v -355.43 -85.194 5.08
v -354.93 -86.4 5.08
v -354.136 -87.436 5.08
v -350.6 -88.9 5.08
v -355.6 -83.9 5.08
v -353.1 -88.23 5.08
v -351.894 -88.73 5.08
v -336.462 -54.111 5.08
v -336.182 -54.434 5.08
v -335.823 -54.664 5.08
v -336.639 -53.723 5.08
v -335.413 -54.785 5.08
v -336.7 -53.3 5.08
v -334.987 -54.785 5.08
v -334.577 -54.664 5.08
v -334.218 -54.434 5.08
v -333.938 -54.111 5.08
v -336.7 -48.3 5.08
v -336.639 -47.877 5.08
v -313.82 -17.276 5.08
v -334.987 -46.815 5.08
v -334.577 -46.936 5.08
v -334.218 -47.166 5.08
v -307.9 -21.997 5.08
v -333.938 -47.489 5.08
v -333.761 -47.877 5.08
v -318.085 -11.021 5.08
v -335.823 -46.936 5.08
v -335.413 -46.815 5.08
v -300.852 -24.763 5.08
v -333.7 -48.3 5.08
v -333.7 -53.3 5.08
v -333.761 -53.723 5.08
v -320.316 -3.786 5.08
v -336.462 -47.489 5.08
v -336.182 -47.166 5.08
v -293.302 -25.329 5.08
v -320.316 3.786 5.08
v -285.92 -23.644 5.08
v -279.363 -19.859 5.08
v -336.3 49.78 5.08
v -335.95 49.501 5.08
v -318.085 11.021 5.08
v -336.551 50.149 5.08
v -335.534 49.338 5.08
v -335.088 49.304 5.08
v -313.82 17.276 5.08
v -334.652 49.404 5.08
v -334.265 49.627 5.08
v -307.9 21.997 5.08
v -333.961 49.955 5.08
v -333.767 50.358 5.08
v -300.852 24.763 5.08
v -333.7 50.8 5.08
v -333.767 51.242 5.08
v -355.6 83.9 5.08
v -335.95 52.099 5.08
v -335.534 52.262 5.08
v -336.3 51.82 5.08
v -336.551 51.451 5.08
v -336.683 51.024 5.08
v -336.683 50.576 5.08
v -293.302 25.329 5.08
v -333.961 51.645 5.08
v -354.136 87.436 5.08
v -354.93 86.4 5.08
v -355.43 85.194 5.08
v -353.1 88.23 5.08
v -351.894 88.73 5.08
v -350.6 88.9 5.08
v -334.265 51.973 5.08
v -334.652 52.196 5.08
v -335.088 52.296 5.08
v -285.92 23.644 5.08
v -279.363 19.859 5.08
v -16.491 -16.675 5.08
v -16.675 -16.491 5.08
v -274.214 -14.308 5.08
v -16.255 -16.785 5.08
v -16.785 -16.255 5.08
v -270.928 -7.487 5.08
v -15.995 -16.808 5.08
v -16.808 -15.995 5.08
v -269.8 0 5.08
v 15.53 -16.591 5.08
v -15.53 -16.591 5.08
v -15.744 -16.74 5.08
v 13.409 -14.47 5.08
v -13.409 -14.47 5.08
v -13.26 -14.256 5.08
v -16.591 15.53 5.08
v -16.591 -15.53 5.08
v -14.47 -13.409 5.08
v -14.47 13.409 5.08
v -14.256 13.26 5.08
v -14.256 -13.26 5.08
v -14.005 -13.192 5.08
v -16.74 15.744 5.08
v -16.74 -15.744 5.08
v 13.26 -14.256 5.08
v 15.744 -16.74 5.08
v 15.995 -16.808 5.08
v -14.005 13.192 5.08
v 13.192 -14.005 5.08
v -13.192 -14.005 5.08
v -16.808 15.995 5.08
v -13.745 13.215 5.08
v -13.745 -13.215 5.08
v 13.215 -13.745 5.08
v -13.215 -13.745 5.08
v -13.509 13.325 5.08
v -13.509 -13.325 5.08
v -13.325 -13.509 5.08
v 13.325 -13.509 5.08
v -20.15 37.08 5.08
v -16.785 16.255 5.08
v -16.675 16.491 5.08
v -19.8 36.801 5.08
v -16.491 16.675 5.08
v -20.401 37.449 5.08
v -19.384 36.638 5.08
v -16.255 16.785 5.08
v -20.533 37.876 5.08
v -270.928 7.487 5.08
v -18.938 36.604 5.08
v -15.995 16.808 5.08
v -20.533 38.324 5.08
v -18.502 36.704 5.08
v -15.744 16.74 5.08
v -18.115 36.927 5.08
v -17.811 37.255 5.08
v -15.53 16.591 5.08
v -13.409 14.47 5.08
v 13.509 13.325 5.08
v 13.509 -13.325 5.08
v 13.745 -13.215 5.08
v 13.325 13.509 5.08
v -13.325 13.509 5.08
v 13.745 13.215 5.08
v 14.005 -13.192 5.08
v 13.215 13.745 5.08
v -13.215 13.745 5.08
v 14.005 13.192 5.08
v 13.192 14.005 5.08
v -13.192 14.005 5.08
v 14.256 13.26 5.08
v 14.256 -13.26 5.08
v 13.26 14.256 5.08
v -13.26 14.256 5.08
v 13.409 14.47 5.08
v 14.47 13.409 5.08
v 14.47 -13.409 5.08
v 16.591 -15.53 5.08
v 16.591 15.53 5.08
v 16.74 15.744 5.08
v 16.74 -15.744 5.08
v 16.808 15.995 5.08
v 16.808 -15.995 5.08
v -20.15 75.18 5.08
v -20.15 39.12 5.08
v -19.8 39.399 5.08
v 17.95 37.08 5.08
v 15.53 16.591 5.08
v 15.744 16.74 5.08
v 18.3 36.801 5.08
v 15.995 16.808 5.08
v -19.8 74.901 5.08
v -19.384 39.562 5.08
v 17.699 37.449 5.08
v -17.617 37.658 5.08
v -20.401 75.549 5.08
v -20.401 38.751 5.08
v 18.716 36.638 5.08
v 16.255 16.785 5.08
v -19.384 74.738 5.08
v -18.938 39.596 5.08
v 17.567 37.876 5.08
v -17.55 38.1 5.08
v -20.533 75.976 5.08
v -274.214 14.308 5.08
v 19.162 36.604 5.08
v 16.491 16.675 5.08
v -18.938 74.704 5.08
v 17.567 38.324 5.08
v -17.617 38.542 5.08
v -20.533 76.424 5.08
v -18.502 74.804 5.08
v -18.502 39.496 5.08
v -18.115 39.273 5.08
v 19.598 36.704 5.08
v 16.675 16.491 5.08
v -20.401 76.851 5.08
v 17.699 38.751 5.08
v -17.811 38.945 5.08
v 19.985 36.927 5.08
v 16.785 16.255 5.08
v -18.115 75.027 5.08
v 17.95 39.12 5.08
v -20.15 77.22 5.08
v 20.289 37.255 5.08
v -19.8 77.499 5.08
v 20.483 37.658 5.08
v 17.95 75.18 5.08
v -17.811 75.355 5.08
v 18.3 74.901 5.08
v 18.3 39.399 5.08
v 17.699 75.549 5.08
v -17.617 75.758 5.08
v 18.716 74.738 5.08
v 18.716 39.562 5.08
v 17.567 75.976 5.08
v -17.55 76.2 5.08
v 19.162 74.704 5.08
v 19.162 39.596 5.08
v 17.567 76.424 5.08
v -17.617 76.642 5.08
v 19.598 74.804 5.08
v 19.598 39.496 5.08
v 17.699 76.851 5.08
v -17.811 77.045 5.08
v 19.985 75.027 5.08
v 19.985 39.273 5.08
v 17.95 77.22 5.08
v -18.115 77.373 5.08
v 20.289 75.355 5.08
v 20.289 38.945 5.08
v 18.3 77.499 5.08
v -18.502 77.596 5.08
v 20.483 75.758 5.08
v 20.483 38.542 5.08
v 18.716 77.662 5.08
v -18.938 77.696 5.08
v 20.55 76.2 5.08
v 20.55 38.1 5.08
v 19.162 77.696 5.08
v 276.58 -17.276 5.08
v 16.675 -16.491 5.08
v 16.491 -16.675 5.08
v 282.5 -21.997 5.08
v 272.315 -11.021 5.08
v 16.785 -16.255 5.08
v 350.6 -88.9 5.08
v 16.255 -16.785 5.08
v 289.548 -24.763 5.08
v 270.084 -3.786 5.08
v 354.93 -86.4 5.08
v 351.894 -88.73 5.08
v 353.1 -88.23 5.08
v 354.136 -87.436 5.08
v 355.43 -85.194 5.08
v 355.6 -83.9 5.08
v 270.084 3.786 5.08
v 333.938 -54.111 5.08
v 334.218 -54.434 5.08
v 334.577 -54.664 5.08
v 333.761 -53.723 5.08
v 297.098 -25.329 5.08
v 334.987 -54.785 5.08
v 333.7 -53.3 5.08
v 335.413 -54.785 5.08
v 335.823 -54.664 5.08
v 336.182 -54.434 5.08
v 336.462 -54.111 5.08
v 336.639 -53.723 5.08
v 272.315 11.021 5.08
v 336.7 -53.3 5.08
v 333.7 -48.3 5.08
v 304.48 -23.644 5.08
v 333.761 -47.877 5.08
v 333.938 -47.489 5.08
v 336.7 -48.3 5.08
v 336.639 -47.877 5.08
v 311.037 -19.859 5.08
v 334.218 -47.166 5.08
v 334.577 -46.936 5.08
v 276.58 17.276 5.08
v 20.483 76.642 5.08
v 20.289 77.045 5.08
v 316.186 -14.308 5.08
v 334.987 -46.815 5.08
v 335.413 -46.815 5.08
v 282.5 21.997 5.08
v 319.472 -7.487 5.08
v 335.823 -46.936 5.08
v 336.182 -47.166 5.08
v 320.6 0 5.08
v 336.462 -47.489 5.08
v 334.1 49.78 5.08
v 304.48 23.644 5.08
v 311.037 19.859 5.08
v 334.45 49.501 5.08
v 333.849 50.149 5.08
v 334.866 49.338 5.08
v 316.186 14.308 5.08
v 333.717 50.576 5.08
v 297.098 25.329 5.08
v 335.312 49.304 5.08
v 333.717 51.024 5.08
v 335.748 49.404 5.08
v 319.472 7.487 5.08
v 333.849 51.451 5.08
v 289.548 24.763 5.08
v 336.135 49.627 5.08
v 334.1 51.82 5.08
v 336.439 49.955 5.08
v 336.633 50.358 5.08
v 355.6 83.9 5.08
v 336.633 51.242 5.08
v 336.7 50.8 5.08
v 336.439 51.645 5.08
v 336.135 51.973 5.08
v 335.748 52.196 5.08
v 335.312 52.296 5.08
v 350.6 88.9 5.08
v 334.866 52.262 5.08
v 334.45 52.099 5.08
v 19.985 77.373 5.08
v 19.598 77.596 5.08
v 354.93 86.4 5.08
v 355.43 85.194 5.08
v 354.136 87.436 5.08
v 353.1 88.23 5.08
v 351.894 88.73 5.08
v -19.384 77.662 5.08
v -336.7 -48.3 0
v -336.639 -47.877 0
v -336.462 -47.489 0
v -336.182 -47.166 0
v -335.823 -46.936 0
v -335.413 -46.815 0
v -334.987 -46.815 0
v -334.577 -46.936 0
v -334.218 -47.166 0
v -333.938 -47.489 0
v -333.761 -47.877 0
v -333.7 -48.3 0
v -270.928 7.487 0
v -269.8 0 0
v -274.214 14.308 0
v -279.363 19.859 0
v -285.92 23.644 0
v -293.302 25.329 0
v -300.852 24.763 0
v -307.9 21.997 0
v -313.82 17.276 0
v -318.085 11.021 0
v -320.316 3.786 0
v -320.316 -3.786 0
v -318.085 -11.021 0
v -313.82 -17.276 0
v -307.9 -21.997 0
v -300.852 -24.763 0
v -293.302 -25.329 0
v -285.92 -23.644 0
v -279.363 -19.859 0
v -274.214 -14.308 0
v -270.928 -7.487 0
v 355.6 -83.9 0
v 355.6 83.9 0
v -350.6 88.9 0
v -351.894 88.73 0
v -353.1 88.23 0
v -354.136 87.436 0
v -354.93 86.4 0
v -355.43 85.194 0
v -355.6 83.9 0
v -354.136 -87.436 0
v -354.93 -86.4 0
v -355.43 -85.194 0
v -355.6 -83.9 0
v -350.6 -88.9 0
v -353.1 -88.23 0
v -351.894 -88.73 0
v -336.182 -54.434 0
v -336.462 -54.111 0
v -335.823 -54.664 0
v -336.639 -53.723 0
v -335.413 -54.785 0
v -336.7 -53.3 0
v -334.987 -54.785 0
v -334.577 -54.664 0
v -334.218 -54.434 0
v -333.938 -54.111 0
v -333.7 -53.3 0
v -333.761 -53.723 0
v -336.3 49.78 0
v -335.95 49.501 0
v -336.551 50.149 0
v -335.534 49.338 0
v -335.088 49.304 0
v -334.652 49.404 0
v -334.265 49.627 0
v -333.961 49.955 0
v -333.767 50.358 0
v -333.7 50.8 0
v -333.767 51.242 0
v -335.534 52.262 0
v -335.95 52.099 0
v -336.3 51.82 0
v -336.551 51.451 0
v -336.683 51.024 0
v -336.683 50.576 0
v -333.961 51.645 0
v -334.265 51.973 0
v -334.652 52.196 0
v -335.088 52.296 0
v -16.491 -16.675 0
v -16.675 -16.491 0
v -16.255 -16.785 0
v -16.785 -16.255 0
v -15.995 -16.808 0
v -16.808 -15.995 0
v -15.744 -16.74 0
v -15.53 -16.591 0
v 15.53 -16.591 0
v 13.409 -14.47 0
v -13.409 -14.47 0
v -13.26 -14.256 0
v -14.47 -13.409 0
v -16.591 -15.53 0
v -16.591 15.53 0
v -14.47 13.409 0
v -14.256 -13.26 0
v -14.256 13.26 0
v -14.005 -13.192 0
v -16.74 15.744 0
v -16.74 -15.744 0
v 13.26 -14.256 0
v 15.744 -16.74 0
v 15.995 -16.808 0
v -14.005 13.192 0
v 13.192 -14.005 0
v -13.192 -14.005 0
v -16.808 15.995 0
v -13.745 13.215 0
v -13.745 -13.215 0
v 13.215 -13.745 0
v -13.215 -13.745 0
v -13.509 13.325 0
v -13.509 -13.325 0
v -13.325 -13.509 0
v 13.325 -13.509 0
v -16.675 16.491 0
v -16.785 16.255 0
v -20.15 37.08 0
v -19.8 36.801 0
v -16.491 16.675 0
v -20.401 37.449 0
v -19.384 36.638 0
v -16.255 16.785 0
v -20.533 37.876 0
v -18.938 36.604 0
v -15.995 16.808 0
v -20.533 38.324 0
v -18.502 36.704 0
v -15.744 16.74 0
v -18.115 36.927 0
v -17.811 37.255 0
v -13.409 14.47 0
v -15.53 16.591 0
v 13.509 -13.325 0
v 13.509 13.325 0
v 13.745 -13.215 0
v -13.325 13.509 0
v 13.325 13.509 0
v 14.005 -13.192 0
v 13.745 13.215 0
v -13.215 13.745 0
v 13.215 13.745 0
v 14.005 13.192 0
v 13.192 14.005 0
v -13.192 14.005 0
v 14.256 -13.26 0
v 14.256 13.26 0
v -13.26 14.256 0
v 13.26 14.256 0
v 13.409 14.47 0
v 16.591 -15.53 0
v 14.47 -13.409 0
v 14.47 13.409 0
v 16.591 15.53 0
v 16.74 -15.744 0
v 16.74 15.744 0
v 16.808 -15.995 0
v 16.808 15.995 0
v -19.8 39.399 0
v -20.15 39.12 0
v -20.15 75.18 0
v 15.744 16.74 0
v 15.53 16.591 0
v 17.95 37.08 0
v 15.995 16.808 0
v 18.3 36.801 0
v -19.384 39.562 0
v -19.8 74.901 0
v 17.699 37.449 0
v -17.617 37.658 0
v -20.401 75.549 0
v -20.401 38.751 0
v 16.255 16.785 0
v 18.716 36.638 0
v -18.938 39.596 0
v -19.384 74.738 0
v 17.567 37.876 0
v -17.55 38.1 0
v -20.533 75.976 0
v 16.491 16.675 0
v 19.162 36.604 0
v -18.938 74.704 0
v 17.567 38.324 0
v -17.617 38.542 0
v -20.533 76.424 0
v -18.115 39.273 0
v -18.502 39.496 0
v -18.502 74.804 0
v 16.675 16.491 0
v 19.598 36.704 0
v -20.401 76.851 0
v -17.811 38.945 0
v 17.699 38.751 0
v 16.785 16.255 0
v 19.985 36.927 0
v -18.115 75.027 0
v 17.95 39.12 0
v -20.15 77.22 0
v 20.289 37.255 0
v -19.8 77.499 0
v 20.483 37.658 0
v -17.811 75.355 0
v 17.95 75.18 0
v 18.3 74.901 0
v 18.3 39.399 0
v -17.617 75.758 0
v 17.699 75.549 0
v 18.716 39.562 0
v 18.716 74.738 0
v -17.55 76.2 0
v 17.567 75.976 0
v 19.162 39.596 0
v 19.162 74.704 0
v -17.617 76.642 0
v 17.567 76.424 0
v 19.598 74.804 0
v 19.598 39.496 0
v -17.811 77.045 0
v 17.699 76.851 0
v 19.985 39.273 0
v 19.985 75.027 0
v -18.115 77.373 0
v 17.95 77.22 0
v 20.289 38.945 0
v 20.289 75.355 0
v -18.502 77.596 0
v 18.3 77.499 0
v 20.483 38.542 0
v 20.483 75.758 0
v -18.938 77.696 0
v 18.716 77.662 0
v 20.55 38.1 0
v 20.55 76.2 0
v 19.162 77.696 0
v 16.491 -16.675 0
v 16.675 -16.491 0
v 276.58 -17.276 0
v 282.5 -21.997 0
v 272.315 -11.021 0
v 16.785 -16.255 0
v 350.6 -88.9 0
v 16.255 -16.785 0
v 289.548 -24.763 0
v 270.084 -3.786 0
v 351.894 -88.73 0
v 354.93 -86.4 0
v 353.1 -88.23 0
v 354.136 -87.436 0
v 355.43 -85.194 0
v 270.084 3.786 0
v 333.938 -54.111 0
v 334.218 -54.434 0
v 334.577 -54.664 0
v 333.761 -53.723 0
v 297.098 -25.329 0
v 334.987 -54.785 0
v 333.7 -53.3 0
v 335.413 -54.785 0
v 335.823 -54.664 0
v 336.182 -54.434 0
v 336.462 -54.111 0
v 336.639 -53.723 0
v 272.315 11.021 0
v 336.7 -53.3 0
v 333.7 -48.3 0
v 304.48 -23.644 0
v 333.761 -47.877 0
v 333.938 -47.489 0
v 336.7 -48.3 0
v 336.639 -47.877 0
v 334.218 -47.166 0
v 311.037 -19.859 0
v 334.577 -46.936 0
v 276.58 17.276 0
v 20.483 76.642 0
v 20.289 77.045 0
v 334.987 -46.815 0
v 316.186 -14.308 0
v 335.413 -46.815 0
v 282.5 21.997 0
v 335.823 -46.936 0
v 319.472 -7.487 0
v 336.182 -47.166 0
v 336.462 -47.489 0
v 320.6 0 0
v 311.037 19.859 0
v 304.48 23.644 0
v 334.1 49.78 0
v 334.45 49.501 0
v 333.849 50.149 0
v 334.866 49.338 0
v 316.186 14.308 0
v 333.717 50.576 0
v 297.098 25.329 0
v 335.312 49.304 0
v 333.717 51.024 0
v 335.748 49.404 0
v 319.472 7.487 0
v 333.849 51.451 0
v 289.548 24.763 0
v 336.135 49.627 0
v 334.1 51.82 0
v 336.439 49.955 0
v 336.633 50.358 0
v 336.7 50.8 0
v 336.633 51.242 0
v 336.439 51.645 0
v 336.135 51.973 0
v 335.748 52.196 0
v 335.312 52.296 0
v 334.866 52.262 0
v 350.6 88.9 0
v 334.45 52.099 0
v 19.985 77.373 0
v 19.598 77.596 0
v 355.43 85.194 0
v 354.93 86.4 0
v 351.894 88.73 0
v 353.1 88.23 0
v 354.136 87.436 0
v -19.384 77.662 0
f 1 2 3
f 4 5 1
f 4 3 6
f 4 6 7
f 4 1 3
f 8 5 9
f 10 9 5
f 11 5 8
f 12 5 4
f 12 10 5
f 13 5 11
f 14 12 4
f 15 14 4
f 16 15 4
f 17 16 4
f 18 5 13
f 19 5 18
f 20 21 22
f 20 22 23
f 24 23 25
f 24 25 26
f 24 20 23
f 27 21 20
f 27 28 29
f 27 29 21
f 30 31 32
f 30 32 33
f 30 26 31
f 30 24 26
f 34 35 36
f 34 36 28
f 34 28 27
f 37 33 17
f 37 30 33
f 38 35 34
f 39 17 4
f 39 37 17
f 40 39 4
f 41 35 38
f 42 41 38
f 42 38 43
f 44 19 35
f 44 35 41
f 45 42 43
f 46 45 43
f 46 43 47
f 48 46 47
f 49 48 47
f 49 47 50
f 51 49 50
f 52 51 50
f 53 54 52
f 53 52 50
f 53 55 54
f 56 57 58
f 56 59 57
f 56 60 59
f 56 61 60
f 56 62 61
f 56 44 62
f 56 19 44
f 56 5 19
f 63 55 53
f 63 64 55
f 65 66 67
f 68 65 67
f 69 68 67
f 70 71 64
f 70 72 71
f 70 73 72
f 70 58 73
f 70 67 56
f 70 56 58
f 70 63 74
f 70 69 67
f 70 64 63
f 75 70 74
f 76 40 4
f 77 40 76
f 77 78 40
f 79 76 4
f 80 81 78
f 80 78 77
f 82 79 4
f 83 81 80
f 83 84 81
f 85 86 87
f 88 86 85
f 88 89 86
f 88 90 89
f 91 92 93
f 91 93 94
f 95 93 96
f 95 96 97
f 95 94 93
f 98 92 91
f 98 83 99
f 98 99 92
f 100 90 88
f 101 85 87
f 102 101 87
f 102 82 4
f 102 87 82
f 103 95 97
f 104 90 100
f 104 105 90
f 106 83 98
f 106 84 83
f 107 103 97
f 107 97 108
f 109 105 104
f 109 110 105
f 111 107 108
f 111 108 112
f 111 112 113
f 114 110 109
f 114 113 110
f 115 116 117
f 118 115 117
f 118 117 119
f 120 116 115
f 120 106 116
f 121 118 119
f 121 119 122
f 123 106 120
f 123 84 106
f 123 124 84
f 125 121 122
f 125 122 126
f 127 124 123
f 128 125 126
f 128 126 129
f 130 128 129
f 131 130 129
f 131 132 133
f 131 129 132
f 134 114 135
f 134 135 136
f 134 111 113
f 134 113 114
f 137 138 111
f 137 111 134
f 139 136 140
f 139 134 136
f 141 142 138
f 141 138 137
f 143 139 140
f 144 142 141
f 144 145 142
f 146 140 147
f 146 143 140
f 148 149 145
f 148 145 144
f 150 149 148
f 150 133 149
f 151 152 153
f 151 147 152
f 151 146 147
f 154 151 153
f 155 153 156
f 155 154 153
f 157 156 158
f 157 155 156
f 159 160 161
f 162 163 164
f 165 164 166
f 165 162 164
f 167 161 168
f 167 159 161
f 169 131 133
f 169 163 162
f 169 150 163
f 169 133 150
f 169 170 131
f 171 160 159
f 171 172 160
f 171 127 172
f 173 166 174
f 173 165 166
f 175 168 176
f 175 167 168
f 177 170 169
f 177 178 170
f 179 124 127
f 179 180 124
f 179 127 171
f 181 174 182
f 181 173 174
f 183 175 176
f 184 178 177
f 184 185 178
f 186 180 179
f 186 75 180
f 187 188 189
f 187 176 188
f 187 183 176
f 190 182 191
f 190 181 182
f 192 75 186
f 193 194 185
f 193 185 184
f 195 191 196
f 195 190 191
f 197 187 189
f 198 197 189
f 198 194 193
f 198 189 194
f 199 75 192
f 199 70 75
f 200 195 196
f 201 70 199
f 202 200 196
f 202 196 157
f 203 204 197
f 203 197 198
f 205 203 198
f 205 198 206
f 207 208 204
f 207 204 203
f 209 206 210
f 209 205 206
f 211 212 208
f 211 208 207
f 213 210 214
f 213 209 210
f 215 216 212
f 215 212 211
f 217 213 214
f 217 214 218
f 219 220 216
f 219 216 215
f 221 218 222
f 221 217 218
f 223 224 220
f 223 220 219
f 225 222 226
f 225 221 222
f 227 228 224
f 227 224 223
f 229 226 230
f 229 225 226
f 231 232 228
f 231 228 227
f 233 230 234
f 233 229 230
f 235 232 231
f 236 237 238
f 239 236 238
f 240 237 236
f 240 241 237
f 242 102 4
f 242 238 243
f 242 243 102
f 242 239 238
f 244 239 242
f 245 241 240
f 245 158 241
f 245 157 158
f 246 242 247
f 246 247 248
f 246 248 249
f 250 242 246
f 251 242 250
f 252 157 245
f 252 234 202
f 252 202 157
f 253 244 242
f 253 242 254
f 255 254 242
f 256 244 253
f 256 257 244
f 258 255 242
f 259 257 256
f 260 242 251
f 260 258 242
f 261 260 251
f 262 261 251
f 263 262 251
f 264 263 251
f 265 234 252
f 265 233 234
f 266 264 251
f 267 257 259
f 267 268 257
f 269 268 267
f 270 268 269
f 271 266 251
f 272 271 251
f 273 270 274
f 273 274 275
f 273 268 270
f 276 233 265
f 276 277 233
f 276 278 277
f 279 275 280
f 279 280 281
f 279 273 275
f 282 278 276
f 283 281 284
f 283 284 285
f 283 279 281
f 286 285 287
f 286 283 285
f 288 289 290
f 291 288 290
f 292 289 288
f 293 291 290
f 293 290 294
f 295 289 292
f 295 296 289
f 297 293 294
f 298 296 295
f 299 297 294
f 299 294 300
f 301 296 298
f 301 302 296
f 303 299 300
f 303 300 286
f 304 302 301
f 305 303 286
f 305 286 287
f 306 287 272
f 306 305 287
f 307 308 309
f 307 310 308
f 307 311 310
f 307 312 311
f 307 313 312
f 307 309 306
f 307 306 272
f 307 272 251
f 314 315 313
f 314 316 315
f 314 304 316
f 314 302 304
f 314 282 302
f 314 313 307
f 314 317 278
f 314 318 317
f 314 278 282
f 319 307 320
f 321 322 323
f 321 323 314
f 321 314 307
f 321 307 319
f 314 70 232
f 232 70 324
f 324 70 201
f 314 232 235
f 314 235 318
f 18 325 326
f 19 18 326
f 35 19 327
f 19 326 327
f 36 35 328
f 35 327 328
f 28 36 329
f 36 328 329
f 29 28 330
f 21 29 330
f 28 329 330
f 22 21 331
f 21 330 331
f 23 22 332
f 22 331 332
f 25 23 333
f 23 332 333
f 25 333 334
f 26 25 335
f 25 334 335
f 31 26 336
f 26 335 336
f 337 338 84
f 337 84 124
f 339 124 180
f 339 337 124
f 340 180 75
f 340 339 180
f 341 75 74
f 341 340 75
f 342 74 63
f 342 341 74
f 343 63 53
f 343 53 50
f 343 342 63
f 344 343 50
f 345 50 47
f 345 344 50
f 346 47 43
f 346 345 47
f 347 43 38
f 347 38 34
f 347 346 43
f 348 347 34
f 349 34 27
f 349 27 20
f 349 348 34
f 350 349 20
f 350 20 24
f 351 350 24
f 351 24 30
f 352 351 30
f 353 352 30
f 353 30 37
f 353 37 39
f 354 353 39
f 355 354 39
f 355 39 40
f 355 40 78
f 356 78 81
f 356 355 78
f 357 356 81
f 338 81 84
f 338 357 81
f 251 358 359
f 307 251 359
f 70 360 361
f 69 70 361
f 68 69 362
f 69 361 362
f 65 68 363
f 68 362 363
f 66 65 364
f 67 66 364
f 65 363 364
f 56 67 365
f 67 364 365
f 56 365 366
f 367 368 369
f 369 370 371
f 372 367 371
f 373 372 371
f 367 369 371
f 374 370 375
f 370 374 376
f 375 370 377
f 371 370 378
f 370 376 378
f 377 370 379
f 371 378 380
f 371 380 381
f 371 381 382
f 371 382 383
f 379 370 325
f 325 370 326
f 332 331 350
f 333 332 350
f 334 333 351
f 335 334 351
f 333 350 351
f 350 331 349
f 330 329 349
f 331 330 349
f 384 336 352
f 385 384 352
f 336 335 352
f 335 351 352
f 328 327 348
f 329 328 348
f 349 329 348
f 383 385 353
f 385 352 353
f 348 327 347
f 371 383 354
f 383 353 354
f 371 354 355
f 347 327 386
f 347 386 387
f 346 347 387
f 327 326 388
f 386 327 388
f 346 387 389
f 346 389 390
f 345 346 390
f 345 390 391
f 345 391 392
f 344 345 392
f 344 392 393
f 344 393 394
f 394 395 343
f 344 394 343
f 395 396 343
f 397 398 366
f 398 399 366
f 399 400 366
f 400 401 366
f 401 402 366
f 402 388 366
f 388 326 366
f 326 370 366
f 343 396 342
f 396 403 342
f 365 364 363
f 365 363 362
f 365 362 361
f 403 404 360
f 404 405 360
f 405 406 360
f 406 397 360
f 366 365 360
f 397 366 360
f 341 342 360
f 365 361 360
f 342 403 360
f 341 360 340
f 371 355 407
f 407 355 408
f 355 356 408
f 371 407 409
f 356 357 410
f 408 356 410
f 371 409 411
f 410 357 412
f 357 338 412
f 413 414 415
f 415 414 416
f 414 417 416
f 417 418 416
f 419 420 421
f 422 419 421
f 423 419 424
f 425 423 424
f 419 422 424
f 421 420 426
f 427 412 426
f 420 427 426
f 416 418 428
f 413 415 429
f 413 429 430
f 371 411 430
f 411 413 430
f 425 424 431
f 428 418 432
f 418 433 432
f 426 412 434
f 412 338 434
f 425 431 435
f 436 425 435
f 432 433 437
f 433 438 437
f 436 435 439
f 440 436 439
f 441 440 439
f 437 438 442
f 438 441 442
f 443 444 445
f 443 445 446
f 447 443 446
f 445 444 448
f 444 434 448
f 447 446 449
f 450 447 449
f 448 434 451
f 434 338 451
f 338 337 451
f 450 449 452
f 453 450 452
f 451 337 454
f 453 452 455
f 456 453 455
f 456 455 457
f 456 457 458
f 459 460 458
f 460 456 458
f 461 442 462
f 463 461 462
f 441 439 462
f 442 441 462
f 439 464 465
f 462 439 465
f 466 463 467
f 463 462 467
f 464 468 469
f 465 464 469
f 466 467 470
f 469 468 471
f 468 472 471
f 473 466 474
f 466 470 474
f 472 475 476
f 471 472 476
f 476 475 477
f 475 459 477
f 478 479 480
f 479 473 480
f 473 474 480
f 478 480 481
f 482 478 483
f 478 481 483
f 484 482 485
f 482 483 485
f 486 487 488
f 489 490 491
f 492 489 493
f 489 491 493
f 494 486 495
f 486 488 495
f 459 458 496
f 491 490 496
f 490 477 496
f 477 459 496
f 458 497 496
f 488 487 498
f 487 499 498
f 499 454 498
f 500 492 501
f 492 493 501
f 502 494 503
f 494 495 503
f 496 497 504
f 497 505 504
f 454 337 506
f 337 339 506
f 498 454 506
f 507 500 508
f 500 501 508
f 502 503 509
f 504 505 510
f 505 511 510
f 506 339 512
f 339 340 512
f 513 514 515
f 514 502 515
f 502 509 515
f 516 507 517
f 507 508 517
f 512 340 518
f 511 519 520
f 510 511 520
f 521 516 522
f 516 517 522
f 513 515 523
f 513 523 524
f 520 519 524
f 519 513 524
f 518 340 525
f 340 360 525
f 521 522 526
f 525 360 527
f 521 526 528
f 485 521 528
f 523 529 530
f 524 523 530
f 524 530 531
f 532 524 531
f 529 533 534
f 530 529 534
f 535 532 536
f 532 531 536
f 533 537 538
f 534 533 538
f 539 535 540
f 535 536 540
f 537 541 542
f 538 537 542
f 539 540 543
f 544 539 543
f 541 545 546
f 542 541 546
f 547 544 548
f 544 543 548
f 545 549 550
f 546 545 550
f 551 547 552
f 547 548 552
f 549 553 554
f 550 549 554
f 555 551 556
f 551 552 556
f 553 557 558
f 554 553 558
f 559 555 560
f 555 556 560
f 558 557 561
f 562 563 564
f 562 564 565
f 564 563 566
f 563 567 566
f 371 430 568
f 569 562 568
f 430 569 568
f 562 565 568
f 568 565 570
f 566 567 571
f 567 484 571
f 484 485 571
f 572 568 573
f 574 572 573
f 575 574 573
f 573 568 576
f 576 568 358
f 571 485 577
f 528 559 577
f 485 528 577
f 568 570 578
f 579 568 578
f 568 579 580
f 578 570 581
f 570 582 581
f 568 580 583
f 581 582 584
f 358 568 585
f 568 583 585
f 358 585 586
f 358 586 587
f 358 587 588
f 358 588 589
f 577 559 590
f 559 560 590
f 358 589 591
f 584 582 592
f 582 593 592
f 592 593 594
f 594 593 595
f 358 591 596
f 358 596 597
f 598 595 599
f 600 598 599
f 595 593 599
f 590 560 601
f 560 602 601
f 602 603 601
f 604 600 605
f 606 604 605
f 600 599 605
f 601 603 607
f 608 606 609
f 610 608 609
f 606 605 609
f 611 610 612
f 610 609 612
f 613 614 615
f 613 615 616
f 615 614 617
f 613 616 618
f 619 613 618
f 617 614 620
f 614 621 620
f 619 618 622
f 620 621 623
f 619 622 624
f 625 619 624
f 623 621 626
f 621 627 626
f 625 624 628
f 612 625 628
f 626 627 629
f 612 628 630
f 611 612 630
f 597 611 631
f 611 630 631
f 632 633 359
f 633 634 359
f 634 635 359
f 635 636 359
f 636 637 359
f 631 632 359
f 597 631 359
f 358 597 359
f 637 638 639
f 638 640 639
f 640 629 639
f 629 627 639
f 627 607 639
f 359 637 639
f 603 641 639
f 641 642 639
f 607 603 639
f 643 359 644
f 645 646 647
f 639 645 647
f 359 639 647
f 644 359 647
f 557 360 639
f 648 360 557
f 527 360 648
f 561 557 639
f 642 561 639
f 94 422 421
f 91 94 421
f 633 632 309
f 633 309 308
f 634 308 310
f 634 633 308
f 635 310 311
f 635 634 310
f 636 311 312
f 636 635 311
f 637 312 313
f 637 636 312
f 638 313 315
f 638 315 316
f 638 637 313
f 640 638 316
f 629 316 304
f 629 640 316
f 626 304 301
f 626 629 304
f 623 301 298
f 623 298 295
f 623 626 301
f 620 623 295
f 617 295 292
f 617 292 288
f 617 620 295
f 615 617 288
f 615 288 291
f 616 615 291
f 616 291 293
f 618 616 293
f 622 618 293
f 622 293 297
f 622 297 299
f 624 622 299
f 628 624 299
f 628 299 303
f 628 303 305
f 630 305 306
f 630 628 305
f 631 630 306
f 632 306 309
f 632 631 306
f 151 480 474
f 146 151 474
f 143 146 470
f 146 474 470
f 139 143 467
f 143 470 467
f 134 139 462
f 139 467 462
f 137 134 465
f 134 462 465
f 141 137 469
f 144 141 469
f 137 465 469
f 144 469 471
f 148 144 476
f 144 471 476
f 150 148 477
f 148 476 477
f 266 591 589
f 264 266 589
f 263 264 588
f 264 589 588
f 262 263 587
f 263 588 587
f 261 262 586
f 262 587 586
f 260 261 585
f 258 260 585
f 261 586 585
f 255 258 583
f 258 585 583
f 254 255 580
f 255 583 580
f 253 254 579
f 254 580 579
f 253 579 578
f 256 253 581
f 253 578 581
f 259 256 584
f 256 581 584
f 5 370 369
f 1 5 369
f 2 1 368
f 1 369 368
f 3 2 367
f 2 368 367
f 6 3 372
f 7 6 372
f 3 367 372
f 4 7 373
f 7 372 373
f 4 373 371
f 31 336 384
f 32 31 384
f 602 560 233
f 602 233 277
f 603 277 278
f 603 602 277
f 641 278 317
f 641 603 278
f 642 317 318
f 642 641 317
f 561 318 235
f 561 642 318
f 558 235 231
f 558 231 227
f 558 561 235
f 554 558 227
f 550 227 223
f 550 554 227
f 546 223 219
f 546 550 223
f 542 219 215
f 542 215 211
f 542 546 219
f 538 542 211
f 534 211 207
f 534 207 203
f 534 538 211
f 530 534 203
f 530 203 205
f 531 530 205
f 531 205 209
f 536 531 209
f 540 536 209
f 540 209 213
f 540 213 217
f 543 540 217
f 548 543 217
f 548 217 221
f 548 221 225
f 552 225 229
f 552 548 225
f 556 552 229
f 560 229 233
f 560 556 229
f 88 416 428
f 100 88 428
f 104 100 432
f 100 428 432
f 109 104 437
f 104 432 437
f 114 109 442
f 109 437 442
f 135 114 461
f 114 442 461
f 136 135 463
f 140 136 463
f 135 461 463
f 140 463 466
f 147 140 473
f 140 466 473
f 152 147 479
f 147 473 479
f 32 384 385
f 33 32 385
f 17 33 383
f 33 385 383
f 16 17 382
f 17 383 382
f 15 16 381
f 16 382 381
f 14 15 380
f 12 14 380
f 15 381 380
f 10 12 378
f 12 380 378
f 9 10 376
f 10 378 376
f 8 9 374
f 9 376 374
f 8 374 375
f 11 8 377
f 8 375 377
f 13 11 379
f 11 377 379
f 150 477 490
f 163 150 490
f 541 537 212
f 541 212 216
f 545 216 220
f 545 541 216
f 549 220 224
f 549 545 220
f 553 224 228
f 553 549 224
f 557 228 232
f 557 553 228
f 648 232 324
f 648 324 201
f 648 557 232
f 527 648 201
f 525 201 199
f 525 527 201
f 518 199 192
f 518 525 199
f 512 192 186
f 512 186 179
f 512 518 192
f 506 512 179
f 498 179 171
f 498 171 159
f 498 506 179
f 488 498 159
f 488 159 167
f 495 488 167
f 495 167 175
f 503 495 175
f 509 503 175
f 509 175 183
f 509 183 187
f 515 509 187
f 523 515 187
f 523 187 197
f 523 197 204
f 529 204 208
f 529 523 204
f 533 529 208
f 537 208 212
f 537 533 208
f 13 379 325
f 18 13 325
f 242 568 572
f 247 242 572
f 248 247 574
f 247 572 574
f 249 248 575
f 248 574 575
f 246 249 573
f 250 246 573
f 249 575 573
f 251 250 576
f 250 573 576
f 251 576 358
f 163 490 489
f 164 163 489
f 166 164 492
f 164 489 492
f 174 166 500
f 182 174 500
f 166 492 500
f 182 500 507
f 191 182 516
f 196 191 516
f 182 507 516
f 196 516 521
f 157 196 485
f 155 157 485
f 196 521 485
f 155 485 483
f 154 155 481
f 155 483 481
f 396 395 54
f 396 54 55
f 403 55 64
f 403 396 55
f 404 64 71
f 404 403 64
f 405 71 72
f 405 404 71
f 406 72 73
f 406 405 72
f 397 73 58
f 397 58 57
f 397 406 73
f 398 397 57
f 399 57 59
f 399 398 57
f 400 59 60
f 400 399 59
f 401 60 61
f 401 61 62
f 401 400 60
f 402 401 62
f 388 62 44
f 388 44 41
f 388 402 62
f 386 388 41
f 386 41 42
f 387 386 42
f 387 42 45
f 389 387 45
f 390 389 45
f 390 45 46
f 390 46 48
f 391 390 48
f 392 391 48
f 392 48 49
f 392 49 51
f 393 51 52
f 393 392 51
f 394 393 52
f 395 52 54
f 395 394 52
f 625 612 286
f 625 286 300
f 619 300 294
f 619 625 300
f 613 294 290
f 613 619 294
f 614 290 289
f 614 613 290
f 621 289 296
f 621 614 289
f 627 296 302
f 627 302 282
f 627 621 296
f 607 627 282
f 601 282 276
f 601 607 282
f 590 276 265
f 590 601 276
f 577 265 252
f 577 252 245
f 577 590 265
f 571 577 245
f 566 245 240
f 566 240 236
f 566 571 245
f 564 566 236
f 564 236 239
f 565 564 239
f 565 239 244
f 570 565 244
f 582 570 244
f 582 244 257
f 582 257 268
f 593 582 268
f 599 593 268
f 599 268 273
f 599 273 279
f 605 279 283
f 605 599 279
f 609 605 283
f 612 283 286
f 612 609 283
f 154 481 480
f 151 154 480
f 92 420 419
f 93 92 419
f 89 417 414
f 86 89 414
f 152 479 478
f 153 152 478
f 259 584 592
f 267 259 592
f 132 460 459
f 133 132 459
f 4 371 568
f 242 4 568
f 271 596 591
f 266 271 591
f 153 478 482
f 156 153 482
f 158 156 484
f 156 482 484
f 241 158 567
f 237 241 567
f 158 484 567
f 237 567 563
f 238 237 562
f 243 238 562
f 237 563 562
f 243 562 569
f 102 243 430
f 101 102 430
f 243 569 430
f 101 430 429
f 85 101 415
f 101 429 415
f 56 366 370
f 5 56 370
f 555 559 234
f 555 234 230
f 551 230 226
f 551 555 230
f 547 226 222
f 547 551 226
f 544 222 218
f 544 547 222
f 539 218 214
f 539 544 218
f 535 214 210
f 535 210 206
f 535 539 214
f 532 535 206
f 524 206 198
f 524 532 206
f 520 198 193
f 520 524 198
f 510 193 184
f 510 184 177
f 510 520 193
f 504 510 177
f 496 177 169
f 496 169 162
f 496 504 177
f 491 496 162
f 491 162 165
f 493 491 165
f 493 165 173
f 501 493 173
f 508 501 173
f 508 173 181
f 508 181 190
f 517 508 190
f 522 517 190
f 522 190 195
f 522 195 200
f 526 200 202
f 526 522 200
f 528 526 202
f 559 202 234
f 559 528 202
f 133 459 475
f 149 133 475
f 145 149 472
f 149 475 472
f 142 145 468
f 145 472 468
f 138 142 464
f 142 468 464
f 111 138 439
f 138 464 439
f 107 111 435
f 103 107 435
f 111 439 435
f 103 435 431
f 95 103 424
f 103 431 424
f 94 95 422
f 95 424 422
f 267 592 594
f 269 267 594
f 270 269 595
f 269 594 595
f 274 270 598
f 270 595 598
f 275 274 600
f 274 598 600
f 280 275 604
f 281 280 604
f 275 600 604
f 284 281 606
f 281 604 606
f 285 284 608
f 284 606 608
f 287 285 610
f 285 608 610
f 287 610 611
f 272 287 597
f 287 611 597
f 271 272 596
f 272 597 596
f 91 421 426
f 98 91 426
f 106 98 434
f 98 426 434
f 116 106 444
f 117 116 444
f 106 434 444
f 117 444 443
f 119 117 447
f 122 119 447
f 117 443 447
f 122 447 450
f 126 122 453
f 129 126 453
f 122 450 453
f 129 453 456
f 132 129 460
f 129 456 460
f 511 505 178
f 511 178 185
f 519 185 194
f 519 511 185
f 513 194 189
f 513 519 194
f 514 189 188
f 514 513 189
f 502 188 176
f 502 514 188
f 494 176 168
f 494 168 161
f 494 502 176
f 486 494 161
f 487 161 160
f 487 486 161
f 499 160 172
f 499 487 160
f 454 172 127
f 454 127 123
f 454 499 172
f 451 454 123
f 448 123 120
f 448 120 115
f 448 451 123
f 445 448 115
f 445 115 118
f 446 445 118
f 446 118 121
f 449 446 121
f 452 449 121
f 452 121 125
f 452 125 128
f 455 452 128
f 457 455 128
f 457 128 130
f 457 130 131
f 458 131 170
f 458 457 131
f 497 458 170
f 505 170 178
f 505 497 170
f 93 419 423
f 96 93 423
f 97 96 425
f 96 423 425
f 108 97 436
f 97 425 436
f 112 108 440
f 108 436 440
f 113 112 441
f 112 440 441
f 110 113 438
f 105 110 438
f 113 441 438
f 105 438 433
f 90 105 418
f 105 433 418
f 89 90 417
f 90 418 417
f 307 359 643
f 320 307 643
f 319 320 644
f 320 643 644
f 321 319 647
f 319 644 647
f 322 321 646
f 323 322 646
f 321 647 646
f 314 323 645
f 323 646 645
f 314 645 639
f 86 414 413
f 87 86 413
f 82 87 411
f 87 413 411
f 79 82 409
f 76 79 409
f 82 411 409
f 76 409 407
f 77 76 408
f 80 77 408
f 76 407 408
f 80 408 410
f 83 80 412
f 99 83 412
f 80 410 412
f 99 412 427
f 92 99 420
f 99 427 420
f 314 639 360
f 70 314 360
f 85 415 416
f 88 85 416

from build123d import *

# Parameters (mm, degrees)
F0_R     = 25.4
F0_R_2   = 1.5
F1_DEPTH = 5.08


with BuildPart() as f1:
    # F0 (on Top) → F1 (new body)
    with BuildSketch(Plane.XY):
        with BuildLine():
            ThreePointArc((355.6, 83.9), (354.135534, 87.435534), (350.6, 88.9))
            Line((350.6, 88.9), (-350.6, 88.9))
            ThreePointArc((-350.6, 88.9), (-354.135534, 87.435534), (-355.6, 83.9))
            Line((-355.6, 83.9), (-355.6, -83.9))
            ThreePointArc((-355.6, -83.9), (-354.135534, -87.435534), (-350.6, -88.9))
            Line((-350.6, -88.9), (350.6, -88.9))
            ThreePointArc((350.6, -88.9), (354.135534, -87.435534), (355.6, -83.9))
            Line((355.6, -83.9), (355.6, 83.9))
        make_face()
        with BuildLine():
            ThreePointArc((-333.7, -53.3), (-335.2, -54.8), (-336.7, -53.3))
            Line((-336.7, -53.3), (-336.7, -48.3))
            ThreePointArc((-336.7, -48.3), (-335.2, -46.8), (-333.7, -48.3))
            Line((-333.7, -48.3), (-333.7, -53.3))
        make_face(mode=Mode.SUBTRACT)
        with BuildLine():
            ThreePointArc((-15.53033, -16.59099), (-16.59099, -16.59099), (-16.59099, -15.53033))
            Line((-16.59099, -15.53033), (-14.46967, -13.40901))
            ThreePointArc((-14.46967, -13.40901), (-13.40901, -13.40901), (-13.40901, -14.46967))
            Line((-13.40901, -14.46967), (-15.53033, -16.59099))
        make_face(mode=Mode.SUBTRACT)
        with BuildLine():
            Line((333.7, -53.3), (333.7, -48.3))
            ThreePointArc((333.7, -48.3), (335.2, -46.8), (336.7, -48.3))
            Line((336.7, -48.3), (336.7, -53.3))
            ThreePointArc((336.7, -53.3), (335.2, -54.8), (333.7, -53.3))
        make_face(mode=Mode.SUBTRACT)
        with BuildLine():
            ThreePointArc((16.59099, -15.53033), (16.59099, -16.59099), (15.53033, -16.59099))
            Line((15.53033, -16.59099), (13.40901, -14.46967))
            ThreePointArc((13.40901, -14.46967), (13.40901, -13.40901), (14.46967, -13.40901))
            Line((14.46967, -13.40901), (16.59099, -15.53033))
        make_face(mode=Mode.SUBTRACT)
        with Locations((-295.2, 0)):
            Circle(F0_R, mode=Mode.SUBTRACT)
        with BuildLine():
            ThreePointArc((-13.40901, 14.46967), (-13.40901, 13.40901), (-14.46967, 13.40901))
            Line((-14.46967, 13.40901), (-16.59099, 15.53033))
            ThreePointArc((-16.59099, 15.53033), (-16.59099, 16.59099), (-15.53033, 16.59099))
            Line((-15.53033, 16.59099), (-13.40901, 14.46967))
        make_face(mode=Mode.SUBTRACT)
        with Locations((-19.05, 38.1)):
            Circle(F0_R_2, mode=Mode.SUBTRACT)
        with Locations((-335.2, 50.8)):
            Circle(F0_R_2, mode=Mode.SUBTRACT)
        with Locations((-19.05, 76.2)):
            Circle(F0_R_2, mode=Mode.SUBTRACT)
        with BuildLine():
            ThreePointArc((14.46967, 13.40901), (13.40901, 13.40901), (13.40901, 14.46967))
            Line((13.40901, 14.46967), (15.53033, 16.59099))
            ThreePointArc((15.53033, 16.59099), (16.59099, 16.59099), (16.59099, 15.53033))
            Line((16.59099, 15.53033), (14.46967, 13.40901))
        make_face(mode=Mode.SUBTRACT)
        with Locations((19.05, 38.1)):
            Circle(F0_R_2, mode=Mode.SUBTRACT)
        with Locations((295.2, 0)):
            Circle(F0_R, mode=Mode.SUBTRACT)
        with Locations((19.05, 76.2)):
            Circle(F0_R_2, mode=Mode.SUBTRACT)
        with Locations((335.2, 50.8)):
            Circle(F0_R_2, mode=Mode.SUBTRACT)
    extrude(amount=F1_DEPTH)


solid = f1.part
